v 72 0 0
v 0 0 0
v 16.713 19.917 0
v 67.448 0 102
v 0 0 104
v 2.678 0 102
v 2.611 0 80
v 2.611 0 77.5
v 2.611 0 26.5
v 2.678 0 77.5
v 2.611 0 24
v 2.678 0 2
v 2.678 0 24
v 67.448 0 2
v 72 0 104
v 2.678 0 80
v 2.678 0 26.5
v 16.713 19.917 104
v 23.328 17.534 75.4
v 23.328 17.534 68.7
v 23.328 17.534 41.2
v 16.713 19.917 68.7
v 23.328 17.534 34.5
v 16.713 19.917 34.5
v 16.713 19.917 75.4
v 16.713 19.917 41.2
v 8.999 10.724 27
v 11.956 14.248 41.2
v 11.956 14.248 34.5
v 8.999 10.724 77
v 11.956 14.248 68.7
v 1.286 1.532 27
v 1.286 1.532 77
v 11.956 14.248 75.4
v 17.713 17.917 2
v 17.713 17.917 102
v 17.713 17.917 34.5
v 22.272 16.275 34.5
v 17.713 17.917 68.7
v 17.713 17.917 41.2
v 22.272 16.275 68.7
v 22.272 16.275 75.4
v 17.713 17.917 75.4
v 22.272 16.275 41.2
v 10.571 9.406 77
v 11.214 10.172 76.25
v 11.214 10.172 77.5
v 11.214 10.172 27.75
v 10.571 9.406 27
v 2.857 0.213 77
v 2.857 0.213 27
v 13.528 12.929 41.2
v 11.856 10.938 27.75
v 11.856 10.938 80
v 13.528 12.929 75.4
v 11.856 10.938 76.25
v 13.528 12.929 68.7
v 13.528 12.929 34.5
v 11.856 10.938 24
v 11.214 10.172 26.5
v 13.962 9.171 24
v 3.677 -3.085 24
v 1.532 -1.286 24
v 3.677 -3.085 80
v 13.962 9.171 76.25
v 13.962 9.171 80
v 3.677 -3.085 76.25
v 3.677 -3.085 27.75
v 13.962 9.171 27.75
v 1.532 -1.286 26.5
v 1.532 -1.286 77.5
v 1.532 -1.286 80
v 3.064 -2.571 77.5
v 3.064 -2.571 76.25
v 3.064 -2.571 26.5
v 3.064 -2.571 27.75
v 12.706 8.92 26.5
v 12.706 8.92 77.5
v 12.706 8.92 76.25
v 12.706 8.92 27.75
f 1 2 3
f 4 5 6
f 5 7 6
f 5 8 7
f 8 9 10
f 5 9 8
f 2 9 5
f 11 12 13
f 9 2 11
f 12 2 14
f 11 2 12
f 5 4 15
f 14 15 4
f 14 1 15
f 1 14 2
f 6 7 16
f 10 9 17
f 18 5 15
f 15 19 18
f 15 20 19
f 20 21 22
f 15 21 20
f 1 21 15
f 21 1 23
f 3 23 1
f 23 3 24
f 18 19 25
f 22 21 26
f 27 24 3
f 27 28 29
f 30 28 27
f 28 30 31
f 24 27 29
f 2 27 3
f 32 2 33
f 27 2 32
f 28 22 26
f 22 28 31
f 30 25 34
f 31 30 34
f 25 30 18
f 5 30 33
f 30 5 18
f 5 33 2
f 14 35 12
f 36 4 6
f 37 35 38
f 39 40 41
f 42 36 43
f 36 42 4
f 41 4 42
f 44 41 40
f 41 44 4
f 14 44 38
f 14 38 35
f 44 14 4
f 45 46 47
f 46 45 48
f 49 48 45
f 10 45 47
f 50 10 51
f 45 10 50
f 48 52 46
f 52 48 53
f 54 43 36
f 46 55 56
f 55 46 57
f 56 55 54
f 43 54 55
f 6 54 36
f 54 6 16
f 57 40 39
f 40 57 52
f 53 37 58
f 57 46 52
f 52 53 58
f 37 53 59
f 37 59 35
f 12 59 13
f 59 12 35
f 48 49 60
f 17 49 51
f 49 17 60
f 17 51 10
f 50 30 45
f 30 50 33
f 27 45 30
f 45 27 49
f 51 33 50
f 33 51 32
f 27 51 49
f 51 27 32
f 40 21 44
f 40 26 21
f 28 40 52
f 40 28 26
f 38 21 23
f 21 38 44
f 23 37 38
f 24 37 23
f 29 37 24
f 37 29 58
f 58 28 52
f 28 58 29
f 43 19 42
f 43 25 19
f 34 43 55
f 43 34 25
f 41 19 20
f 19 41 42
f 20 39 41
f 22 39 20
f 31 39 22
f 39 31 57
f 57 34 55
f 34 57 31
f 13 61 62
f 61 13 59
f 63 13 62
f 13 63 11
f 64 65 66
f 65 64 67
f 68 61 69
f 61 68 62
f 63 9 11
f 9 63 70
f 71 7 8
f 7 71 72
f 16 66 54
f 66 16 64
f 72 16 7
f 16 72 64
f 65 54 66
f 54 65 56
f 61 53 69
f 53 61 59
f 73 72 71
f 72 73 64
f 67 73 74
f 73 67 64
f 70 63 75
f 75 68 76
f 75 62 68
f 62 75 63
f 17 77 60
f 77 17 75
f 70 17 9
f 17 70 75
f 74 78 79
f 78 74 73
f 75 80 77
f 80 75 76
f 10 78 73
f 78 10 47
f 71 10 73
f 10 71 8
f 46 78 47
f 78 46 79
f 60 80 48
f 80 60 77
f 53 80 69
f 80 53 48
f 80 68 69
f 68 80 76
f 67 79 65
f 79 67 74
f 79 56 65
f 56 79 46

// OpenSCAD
//UVC-LED housing

UVC_housing();

module UVC_housing() {
difference() {
UVC_module();
    rotate([90, 270, 50]) translate([8, -49, -2.1])
    union() {
    translate([26.5, 8.4, 2]) cube([6.7, 22, 6.7]);
    translate([60.7, 8.4, 2]) cube([6.7, 22, 6.7]); 
    }
}    
rotate([90, 90, 50]) translate([-80, 0, 2]) filterholder();
}
module UVC_module() {
difference() {
linear_extrude(height = 104, scale = 1) 
polygon(points=[[0,0],[72,0],[16.713, 19.917]]);
translate([1,-2,2])
linear_extrude(height = 100, scale = 1) 
polygon(points=[[0,0],[72,0],[16.713,19.917]]);
    rotate ([0,0,50]) translate([2,-10,27]) cube([12,22,50]);
}
}
module filterholder() {
difference() {
cube([56, 16, 2.8]);
translate([2.5, 0, 0]) cube([51, 15, 2]);
translate([3.75, 0, 0]) cube([48.5, 13, 8]);
translate([3.75, 0, 0]) cube([48.5, 16, 8]);
}
}
